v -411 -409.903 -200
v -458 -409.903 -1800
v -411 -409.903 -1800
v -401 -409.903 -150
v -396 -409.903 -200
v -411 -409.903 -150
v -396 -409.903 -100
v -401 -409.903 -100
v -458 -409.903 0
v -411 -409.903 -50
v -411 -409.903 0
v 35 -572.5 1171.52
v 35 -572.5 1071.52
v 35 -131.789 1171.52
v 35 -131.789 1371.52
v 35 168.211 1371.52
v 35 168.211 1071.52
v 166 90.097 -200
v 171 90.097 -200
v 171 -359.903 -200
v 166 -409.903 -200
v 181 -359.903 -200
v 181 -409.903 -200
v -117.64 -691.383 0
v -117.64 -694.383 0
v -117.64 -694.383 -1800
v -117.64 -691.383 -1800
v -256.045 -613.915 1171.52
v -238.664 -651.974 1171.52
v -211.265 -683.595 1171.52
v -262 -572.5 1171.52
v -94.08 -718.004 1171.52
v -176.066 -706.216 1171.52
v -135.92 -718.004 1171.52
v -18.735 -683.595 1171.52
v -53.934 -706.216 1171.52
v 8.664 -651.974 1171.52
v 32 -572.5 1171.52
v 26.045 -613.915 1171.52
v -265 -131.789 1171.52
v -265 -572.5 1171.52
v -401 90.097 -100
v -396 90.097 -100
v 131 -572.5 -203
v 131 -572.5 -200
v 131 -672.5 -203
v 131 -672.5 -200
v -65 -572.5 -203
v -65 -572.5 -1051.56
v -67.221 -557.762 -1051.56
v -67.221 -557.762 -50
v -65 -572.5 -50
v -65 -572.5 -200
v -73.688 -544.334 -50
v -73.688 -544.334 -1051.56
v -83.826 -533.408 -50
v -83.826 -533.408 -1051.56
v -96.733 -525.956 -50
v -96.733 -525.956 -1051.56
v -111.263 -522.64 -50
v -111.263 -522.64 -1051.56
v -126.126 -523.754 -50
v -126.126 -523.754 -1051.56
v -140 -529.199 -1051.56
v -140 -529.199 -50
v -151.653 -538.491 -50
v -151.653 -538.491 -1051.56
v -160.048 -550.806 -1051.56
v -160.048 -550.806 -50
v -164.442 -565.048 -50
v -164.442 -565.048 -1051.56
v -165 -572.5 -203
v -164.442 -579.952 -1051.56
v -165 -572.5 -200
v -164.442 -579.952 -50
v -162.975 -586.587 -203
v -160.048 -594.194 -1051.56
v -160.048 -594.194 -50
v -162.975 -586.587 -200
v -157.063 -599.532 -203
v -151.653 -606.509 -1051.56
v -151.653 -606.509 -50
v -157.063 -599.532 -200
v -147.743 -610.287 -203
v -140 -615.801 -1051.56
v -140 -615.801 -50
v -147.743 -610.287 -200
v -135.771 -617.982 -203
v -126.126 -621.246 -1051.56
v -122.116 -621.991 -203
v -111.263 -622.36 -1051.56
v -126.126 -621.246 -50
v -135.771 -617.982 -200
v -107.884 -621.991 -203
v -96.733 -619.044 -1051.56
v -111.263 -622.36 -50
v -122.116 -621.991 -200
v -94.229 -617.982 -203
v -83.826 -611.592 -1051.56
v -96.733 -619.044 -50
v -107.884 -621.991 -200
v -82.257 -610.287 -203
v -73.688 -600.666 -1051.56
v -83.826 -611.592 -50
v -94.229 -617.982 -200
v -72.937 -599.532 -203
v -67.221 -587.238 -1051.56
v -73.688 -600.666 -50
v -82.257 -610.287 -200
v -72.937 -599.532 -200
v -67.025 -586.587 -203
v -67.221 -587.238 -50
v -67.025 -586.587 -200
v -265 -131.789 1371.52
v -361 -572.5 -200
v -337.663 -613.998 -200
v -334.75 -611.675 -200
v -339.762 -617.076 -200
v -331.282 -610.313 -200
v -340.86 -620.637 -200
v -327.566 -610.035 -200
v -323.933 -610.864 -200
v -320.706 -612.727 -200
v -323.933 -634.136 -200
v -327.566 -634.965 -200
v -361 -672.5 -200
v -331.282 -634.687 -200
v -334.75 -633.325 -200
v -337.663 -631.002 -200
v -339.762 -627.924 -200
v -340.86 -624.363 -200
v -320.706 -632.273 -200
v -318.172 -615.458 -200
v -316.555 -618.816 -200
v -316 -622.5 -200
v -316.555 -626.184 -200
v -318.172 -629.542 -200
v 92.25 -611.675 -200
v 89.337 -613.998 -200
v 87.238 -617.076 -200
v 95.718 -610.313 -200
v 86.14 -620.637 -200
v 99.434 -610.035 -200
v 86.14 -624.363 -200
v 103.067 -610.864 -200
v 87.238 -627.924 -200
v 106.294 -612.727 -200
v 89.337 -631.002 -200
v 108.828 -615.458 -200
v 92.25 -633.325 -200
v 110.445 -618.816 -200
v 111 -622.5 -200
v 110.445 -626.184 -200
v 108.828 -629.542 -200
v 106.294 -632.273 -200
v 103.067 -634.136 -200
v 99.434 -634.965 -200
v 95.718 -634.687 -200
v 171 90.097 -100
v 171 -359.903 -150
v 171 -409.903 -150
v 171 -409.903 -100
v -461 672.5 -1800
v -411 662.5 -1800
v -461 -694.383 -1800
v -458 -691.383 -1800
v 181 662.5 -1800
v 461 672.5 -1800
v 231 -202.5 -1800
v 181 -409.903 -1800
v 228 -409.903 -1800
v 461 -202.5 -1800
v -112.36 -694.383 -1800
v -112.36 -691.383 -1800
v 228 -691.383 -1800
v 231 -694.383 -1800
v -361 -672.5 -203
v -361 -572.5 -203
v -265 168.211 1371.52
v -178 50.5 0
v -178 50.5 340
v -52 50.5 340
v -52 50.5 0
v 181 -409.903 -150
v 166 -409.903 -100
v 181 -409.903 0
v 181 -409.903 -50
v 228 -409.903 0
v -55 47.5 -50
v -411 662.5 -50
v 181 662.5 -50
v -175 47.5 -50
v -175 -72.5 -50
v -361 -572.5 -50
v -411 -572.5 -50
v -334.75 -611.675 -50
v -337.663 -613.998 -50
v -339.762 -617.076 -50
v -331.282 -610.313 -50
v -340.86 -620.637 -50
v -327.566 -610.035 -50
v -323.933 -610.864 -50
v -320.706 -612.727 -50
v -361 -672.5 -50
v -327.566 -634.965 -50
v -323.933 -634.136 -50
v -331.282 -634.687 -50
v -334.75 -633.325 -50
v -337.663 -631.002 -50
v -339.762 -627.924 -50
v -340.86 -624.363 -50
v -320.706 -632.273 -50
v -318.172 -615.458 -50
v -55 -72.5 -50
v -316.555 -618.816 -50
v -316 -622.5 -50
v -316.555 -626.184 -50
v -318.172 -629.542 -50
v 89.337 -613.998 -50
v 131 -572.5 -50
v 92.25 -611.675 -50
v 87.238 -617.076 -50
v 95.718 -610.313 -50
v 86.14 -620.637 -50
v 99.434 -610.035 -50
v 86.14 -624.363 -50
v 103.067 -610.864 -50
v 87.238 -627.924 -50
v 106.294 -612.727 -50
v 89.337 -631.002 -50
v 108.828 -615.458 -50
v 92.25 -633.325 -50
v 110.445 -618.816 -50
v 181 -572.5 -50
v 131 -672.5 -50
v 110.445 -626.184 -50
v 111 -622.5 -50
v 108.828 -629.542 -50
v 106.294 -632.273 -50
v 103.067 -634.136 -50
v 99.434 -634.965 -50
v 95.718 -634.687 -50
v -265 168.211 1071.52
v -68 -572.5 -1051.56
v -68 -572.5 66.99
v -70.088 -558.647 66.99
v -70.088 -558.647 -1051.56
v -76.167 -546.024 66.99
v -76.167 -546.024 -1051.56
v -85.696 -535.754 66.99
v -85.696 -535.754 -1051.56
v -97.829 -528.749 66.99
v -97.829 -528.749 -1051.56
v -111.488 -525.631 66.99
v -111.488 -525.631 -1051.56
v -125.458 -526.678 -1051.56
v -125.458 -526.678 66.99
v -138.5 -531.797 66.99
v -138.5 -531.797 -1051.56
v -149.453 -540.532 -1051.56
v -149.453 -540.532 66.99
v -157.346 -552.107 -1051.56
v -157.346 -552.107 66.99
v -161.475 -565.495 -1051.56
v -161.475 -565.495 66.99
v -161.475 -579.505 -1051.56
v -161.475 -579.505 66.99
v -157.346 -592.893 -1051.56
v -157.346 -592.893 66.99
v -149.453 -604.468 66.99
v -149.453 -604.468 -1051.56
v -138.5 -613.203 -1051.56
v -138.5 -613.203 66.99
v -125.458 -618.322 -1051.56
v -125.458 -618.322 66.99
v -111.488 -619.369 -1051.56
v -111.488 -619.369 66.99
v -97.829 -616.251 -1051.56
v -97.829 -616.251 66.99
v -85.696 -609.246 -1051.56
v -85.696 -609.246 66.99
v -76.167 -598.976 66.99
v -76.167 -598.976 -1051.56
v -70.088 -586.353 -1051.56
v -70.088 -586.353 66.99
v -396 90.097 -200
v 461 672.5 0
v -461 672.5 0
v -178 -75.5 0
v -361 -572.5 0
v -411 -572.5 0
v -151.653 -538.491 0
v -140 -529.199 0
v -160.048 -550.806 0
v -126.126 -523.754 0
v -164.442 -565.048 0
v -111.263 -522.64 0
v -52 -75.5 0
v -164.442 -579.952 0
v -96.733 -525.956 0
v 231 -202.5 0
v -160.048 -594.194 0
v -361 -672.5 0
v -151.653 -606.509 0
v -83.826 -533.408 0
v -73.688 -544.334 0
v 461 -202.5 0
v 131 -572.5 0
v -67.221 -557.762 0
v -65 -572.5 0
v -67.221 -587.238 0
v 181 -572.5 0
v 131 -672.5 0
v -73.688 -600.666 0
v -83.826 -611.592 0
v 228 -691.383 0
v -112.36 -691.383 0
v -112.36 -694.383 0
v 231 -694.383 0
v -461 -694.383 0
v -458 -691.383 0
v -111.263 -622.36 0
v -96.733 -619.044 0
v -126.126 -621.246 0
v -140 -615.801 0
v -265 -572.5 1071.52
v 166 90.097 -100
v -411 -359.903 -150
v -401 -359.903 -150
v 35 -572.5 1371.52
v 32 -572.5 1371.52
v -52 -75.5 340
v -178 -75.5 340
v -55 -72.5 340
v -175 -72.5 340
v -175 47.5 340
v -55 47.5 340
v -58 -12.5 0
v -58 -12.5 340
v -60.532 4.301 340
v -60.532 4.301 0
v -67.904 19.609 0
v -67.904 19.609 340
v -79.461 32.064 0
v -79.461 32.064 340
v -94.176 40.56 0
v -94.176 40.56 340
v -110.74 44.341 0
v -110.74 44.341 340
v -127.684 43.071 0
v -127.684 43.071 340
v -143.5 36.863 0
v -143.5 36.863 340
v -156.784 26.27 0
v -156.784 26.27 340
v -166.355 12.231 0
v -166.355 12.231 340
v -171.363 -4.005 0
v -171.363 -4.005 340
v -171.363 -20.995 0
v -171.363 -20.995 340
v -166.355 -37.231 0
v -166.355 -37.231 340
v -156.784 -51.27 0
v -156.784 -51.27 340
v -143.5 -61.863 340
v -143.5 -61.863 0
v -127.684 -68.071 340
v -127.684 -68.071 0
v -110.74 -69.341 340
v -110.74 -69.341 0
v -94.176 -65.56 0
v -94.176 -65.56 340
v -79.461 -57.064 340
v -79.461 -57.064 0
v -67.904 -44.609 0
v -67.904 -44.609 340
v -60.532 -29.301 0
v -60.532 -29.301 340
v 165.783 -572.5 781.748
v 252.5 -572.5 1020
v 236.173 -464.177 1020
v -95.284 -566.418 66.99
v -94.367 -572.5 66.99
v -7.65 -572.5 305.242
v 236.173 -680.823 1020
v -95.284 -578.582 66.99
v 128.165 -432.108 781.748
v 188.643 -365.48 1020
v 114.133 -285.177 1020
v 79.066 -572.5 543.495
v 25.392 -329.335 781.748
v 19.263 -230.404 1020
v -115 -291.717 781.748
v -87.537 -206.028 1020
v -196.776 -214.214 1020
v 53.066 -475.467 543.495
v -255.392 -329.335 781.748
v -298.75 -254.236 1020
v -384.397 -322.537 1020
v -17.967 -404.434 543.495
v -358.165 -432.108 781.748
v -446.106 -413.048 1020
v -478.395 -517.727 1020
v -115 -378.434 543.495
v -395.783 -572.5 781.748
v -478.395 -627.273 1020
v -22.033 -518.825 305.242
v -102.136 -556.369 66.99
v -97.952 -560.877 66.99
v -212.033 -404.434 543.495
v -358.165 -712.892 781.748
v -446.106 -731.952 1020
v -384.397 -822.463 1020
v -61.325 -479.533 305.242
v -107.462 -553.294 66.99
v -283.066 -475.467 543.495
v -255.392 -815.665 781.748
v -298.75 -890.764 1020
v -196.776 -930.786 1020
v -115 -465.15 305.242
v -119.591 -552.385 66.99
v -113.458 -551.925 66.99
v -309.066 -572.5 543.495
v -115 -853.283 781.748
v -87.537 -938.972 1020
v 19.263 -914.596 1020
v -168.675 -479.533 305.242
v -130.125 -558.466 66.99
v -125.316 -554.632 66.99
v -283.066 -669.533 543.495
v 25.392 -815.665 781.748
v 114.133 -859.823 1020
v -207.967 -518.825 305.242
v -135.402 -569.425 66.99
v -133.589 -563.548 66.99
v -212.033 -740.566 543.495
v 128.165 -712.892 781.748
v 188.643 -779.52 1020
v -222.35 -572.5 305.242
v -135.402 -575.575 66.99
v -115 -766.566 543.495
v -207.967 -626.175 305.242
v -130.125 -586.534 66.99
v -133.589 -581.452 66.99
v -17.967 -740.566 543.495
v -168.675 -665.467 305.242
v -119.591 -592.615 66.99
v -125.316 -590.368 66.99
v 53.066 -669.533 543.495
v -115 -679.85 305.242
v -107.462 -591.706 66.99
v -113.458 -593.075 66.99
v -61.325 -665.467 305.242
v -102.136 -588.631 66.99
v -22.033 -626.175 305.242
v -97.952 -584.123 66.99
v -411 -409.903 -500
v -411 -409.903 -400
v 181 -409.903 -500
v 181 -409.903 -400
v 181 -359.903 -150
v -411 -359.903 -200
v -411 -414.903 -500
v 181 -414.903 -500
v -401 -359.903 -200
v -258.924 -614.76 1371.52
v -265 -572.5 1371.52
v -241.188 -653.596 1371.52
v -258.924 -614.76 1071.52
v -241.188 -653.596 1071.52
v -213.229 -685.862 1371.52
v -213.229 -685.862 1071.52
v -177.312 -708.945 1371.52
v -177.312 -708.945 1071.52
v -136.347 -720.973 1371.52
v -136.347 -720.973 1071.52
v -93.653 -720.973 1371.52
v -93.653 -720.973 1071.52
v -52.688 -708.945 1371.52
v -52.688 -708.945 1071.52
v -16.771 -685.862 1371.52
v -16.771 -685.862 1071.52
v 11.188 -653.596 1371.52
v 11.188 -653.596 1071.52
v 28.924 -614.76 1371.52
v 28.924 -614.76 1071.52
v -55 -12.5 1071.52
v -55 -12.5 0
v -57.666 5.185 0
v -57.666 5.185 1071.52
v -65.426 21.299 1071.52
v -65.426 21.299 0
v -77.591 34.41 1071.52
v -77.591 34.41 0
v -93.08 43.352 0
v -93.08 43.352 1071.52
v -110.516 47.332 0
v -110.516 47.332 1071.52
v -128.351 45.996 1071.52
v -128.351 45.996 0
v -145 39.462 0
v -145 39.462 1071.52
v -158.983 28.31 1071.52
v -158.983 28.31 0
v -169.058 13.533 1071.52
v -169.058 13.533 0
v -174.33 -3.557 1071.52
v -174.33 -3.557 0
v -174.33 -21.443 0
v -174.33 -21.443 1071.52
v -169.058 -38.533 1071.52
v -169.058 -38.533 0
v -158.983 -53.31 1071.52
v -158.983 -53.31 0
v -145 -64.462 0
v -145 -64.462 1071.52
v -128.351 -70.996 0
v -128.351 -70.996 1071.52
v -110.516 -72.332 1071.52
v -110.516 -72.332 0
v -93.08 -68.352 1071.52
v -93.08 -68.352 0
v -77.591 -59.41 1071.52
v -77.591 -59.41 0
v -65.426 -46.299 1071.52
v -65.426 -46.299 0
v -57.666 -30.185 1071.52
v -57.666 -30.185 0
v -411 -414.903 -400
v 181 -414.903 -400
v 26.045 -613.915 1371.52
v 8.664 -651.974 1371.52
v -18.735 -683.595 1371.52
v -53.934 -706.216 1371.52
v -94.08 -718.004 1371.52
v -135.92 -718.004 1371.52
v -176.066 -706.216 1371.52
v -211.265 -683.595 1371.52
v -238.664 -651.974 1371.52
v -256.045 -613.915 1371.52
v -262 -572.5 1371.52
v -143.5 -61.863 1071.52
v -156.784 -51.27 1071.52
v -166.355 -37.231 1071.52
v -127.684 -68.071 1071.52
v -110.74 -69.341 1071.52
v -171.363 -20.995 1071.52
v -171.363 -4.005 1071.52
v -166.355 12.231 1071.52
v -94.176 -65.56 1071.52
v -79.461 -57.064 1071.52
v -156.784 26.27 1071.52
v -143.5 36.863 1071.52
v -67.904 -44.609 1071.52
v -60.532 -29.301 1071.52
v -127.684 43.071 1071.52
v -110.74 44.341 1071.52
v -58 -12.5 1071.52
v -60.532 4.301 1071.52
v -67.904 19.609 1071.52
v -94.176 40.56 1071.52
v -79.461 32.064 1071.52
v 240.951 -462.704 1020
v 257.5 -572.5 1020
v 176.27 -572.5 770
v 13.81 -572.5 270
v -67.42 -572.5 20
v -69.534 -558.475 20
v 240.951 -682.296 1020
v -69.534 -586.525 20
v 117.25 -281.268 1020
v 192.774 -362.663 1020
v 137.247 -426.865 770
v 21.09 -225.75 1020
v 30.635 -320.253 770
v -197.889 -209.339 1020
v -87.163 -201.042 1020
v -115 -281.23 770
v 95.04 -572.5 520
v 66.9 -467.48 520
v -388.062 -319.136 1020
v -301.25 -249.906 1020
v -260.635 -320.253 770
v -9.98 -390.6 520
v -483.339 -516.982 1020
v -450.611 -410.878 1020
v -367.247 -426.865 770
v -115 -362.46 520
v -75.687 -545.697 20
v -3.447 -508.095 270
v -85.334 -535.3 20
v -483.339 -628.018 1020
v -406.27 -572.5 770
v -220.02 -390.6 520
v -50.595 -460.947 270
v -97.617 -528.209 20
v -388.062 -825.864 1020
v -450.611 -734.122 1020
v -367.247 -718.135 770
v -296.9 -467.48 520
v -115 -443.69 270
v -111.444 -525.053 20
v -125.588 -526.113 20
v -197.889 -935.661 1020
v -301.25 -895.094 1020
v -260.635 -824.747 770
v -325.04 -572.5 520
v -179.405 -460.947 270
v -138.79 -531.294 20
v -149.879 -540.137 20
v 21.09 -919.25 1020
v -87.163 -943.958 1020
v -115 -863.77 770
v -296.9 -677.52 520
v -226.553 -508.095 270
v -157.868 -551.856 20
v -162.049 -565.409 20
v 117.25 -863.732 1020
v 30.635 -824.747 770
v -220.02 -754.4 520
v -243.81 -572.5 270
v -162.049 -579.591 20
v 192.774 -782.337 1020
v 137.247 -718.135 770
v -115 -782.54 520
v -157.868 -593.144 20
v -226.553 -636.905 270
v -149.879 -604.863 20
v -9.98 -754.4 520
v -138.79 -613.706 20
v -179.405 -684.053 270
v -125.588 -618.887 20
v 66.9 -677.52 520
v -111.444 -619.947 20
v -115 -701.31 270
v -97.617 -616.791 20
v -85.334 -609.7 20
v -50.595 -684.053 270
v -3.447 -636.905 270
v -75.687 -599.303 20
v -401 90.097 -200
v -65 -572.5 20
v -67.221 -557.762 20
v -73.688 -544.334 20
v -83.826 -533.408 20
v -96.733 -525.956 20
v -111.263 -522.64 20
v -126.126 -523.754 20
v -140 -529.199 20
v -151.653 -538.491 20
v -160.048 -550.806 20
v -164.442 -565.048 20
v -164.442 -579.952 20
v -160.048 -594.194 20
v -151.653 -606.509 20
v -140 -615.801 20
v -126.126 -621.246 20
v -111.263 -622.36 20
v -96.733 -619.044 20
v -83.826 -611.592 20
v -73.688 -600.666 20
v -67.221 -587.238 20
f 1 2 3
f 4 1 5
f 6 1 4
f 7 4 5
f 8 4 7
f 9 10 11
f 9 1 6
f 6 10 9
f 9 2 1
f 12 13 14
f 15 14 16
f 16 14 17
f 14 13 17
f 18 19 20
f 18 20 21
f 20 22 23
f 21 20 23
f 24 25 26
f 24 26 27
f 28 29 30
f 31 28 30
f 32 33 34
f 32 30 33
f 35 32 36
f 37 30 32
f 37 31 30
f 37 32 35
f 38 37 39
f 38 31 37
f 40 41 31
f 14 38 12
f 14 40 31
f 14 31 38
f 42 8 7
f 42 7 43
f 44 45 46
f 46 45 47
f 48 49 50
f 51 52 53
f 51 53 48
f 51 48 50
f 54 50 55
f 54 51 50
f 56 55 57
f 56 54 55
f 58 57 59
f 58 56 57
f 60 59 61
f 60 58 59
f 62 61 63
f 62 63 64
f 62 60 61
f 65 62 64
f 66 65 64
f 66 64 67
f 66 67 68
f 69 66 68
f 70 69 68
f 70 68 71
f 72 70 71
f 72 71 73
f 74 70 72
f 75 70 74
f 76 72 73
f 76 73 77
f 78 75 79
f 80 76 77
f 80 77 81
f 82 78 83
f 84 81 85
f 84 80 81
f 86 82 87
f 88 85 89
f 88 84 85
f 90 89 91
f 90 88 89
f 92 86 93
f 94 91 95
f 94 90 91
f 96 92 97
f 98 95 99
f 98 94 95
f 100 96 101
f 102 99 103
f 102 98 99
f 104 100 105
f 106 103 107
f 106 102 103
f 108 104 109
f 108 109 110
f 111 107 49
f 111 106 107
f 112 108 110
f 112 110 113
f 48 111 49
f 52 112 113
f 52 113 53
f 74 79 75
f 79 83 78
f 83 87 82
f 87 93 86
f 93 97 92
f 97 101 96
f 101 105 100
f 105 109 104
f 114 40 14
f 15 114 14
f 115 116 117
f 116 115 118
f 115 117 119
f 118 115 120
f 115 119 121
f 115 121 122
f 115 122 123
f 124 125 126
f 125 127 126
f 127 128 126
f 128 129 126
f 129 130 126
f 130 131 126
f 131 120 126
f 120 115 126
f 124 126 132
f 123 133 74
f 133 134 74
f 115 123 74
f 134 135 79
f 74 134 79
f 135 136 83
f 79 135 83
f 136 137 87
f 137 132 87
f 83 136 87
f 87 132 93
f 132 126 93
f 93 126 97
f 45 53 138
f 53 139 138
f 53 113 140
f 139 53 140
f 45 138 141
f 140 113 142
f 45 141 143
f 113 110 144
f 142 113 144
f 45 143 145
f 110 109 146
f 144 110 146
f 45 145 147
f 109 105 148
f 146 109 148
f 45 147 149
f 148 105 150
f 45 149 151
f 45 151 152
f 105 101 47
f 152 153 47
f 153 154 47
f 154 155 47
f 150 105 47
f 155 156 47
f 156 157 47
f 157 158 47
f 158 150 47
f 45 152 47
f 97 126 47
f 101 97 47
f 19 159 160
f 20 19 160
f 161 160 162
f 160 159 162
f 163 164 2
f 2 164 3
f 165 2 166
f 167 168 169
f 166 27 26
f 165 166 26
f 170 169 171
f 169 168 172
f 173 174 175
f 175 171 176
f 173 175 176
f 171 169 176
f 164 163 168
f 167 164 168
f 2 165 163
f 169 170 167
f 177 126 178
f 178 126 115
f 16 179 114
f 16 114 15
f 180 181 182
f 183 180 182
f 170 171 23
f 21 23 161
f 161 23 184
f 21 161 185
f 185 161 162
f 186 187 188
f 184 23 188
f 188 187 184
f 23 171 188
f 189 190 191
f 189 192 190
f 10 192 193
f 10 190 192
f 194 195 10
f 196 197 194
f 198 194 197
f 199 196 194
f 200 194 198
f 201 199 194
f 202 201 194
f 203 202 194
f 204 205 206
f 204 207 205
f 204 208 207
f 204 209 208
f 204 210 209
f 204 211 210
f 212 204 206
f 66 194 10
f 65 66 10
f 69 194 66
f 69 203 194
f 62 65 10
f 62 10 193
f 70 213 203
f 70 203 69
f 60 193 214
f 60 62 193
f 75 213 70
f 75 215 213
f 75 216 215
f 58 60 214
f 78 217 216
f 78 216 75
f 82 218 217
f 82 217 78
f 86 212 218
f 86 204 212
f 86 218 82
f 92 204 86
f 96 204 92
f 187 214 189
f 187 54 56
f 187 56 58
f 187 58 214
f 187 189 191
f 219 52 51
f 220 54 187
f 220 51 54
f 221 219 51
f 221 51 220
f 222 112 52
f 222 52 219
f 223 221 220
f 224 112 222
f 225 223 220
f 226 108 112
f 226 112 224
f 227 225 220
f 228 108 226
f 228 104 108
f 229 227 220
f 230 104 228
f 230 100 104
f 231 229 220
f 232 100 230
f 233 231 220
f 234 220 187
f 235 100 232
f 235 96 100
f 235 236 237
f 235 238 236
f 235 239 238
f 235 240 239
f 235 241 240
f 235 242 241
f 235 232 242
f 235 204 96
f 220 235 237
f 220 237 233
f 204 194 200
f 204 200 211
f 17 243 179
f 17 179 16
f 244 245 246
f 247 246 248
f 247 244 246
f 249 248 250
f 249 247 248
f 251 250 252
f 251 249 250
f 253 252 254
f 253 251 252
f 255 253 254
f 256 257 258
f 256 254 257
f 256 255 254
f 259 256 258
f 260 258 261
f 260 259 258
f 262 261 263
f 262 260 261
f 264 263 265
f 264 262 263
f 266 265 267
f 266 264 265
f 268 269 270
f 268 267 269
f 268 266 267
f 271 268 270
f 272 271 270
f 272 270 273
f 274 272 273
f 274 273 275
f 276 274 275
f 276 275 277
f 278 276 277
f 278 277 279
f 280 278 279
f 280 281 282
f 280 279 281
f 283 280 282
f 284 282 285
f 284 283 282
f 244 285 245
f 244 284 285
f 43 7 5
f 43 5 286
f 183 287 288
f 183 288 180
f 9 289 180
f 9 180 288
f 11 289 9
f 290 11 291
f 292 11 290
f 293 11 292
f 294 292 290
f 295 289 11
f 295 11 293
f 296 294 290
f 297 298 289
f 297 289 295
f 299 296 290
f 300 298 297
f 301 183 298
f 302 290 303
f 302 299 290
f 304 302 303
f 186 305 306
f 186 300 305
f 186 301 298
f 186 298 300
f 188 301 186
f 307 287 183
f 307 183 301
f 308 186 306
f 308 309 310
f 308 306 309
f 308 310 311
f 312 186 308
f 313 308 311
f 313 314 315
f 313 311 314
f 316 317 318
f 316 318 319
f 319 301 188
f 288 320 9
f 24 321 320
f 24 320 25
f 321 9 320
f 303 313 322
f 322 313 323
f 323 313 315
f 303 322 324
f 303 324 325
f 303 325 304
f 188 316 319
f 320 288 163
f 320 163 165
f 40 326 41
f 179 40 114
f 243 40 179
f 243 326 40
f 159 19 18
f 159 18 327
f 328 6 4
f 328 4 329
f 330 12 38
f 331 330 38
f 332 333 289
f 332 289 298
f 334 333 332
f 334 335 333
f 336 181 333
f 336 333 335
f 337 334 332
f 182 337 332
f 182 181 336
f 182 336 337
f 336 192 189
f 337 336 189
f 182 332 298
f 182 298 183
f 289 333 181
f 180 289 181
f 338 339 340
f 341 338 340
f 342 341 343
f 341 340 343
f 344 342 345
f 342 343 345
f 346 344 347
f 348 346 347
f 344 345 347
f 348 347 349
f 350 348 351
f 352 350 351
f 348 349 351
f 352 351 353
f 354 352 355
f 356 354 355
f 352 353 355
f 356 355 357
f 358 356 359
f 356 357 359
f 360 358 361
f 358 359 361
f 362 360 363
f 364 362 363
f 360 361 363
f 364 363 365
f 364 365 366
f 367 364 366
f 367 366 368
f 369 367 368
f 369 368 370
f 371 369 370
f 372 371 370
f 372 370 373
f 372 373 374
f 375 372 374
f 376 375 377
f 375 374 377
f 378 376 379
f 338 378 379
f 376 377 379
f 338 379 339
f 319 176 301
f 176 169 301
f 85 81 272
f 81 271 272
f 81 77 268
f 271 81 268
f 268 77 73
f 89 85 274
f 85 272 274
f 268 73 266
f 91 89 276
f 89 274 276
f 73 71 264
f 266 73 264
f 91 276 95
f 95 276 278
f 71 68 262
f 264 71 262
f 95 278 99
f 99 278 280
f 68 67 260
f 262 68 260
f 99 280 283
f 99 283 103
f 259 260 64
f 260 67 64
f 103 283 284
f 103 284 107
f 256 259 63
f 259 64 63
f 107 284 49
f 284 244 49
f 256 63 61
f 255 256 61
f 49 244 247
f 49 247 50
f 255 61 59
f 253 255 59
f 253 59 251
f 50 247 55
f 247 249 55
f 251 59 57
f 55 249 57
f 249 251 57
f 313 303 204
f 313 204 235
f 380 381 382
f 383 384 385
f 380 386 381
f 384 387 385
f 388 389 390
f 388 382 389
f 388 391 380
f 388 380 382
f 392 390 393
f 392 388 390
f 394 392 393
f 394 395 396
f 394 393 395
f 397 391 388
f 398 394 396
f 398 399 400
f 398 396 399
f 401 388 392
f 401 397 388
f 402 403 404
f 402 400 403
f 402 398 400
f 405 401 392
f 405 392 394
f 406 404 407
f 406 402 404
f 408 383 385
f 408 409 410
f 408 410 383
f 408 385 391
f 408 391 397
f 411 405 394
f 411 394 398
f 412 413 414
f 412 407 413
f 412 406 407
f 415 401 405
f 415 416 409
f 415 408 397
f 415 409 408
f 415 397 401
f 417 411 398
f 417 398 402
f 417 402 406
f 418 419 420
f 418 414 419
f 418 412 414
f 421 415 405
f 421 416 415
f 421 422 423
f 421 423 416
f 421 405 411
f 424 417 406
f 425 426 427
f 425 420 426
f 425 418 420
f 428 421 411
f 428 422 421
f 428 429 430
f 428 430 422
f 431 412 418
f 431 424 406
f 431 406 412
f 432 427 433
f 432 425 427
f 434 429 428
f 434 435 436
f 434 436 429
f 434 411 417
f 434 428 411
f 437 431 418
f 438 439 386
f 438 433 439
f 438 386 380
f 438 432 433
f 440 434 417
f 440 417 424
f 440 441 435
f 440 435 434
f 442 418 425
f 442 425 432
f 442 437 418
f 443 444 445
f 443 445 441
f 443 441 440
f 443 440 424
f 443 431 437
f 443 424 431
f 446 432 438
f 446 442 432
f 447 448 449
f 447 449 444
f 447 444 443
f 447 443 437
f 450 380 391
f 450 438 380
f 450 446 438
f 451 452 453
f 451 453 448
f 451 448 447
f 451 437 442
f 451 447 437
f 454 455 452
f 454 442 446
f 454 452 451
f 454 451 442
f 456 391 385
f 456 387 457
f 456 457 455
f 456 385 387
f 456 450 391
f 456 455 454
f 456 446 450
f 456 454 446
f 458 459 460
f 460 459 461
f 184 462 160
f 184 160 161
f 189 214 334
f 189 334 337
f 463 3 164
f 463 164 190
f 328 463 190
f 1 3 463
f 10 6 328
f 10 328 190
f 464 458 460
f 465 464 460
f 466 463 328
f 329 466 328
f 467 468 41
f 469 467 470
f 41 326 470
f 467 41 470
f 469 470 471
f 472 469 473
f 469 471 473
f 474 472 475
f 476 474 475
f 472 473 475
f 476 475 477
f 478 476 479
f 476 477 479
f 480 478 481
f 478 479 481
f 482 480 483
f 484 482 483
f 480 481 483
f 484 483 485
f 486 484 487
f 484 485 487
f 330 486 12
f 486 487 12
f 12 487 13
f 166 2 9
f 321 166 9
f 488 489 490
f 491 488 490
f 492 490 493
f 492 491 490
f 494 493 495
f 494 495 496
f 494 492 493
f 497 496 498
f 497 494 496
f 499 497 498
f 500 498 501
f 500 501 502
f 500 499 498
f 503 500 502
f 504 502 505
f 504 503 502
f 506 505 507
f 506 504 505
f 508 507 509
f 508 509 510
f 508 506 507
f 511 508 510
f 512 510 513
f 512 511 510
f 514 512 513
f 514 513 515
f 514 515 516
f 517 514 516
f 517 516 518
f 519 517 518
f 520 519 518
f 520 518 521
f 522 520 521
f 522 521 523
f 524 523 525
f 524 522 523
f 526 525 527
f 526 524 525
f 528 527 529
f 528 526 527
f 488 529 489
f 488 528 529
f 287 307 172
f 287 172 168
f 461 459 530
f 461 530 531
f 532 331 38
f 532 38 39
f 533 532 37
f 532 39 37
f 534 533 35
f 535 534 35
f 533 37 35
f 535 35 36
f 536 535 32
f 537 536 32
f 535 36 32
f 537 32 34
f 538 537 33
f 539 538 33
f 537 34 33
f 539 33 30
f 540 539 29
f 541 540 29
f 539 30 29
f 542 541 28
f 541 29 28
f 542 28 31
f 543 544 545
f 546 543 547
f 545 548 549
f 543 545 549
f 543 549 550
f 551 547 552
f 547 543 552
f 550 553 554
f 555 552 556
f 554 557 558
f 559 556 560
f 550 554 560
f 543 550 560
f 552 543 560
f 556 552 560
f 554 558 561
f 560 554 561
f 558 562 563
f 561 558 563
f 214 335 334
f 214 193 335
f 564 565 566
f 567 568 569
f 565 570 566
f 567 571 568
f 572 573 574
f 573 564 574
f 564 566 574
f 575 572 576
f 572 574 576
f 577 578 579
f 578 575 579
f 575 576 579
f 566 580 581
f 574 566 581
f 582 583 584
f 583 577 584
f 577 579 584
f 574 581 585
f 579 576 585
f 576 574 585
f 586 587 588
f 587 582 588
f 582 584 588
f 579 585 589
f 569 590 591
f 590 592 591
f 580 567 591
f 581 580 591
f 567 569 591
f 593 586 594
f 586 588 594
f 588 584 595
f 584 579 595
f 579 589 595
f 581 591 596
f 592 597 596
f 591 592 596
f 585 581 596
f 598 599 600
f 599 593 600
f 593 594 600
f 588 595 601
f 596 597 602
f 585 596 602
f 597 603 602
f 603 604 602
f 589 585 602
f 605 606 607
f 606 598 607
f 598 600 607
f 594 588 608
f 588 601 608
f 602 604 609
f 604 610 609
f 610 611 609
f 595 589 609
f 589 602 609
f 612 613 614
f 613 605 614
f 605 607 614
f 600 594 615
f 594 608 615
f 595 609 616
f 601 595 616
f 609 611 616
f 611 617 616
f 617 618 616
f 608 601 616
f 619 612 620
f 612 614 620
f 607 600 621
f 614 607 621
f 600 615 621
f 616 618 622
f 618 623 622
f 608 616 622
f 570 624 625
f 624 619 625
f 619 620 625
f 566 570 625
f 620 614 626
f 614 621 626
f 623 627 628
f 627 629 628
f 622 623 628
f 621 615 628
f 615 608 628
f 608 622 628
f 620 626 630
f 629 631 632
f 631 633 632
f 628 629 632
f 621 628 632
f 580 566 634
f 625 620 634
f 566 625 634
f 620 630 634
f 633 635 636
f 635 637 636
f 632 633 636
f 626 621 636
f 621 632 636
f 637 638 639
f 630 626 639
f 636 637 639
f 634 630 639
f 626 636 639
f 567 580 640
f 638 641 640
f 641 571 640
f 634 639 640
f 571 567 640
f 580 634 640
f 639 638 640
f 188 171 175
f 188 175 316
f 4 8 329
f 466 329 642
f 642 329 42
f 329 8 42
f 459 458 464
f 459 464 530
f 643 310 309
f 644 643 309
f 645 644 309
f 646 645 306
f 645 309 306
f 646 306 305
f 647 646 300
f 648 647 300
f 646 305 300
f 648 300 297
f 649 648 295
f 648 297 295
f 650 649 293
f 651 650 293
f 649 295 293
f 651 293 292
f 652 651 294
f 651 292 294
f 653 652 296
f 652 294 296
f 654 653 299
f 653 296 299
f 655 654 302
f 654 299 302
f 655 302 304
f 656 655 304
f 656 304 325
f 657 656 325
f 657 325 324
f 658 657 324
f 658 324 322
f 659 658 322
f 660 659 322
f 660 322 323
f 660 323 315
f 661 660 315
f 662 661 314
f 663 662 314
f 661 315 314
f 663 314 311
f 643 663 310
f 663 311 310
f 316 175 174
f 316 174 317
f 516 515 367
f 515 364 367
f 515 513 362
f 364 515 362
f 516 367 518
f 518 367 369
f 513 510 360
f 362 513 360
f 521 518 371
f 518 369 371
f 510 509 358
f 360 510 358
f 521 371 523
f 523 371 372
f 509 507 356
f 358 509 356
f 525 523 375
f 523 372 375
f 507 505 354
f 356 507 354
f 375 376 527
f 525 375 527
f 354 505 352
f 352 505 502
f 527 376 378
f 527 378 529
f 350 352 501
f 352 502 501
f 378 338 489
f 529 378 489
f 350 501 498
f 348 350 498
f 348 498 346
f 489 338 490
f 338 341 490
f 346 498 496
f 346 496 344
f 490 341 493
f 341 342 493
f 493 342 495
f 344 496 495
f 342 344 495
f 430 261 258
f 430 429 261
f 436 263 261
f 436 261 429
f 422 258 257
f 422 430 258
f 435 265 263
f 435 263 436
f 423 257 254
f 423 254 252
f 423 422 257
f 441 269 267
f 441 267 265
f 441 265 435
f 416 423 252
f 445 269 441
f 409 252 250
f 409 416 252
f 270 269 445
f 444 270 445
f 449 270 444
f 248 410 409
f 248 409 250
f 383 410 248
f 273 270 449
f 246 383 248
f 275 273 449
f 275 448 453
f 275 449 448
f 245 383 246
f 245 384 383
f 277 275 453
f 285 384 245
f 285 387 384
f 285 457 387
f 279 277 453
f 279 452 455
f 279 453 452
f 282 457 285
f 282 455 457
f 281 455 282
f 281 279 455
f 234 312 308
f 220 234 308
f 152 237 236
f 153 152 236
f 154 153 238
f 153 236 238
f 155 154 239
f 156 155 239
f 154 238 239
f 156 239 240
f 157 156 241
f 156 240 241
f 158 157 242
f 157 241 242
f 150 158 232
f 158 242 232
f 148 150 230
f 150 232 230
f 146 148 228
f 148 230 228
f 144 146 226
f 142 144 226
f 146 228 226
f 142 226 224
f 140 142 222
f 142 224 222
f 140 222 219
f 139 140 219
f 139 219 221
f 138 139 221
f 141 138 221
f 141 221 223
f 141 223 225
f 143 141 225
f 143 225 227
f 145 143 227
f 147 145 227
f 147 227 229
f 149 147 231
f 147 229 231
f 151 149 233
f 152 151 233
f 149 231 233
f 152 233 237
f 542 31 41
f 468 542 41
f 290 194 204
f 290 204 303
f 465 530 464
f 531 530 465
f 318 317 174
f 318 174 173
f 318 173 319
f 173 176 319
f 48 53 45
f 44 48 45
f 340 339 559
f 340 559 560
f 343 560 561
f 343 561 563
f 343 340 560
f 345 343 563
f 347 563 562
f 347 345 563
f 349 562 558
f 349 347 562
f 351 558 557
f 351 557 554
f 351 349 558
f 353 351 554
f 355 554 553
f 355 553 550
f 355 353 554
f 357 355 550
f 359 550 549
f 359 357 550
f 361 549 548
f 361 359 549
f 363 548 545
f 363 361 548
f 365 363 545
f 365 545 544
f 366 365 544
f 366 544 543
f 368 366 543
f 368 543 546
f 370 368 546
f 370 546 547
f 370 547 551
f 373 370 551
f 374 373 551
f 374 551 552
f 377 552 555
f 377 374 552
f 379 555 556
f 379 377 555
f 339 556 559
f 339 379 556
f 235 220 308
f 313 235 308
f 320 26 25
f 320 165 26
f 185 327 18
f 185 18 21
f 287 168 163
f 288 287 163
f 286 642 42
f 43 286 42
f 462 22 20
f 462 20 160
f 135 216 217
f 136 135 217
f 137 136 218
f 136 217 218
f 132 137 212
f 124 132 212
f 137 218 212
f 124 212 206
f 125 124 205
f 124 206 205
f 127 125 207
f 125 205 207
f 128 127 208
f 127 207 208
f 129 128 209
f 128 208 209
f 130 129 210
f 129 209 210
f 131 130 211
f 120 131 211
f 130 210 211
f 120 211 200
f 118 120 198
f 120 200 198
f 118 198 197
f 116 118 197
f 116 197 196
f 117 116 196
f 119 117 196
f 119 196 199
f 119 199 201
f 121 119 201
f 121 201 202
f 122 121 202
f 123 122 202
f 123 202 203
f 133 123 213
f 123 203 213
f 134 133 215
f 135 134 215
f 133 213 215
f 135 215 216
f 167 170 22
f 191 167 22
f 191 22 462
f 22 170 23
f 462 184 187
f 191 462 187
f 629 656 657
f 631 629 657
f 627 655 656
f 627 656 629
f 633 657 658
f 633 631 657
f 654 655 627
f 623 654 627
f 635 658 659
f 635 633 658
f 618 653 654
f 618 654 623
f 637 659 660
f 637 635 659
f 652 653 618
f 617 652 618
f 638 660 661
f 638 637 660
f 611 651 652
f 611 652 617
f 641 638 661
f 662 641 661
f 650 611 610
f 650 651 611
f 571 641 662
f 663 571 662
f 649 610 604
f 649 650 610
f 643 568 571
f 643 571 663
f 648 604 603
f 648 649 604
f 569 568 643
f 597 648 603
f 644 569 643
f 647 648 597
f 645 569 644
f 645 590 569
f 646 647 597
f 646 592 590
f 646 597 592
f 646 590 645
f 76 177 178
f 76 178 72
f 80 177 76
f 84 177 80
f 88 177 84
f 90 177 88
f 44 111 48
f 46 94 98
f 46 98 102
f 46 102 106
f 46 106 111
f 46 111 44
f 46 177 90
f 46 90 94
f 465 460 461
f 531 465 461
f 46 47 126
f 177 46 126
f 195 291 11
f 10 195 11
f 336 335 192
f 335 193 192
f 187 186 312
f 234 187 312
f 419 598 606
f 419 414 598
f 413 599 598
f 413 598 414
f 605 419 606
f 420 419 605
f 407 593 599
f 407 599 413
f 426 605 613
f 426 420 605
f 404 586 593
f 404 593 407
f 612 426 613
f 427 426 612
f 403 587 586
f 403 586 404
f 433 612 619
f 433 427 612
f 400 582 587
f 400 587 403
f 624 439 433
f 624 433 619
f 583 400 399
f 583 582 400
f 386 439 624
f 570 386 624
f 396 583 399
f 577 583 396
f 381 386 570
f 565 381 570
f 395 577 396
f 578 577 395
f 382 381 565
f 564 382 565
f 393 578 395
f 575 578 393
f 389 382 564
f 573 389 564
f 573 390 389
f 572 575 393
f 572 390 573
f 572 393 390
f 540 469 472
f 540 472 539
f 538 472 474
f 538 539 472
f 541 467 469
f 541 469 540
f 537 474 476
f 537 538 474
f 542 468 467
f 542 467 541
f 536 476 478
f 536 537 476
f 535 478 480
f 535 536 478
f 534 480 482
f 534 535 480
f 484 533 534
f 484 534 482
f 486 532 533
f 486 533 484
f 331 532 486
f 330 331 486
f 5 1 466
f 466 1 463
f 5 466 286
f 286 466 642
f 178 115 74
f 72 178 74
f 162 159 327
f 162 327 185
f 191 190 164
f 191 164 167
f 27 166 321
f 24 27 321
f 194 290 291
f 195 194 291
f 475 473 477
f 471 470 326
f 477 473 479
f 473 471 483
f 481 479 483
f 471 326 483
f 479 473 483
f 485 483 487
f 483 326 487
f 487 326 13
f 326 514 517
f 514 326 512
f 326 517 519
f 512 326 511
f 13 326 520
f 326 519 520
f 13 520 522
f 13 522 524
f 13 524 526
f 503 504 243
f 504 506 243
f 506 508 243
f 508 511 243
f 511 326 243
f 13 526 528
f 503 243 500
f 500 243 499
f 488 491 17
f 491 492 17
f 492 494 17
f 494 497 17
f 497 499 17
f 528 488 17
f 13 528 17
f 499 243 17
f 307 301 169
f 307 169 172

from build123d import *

# Parameters (mm, degrees)
F0_W           = 692
F0_H           = 470
F1_DEPTH       = 1800
F3_DEPTH       = 1800
F4_W           = 592
F4_H           = 1750
F5_DEPTH       = 1235
F6_W           = 120
F6_H           = 120
F7_DEPTH       = 50
F8_W           = 126
F8_H           = 126
F8_W_2         = 120
F8_H_2         = 120
F9_DEPTH       = 340
F10_R          = 60
F10_R_2        = 57
F11_DEPTH      = 731.52
F11_DEPTH_BACK = 340
F12_W          = 492
F12_H          = 50
F13_DEPTH      = 100
F14_R          = 50
F15_DEPTH      = 50
F16_R          = 50
F16_R_2        = 47
F17_DEPTH      = 1051.56
F17_DEPTH_BACK = 20
F18_W          = 50
F18_H          = 50
F19_DEPTH      = 10
F20_W          = 50
F20_H          = 50
F21_DEPTH      = 10
F22_W          = 500
F22_H          = 100
F23_DEPTH      = 5
F24_W          = 500
F24_H          = 100
F25_DEPTH      = 5
F26_W          = 592
F26_H          = 100
F27_DEPTH      = 5
F28_R          = 12.5
F29_DEPTH      = 150
F31_DEPTH      = 3
F33_R          = 372.5
F34_DEPTH      = 1000
F34_TAPER      = 18
F35_R          = 367.5
F36_DEPTH      = 1002.284
F36_TAPER      = 20
F37_R          = 47
F38_DEPTH      = 46.99
F40_DEPTH      = 100
F41_W          = 300
F41_H          = 300
F42_DEPTH      = 200
F44_DEPTH      = 200
F46_W          = 3
F46_H          = 1800
F45_W          = 3
F45_H          = 1800
F47_DEPTH      = 284.48
F48_W          = 3
F48_H          = 1800
F49_DEPTH      = 340.36
F50_W          = 3
F50_H          = 1800
F51_DEPTH      = 340.36


with BuildPart() as f1:
    # F0 (on Top) → F1 (new body)
    with BuildSketch(Plane.XY):
        Polygon((-461, -202.5), (231, -202.5), (461, -202.5), (461, 672.5), (-461, 672.5), align=None)
        with Locations((-115, -437.5)):
            Rectangle(F0_W, F0_H)
    extrude(amount=-F1_DEPTH)

    # F2 (on face) → F3 (cut, through all)
    with BuildSketch(Plane.XY):
        Polygon((-411, -409.9026024342), (-461, -409.9026024342), (-461, -672.5), (231, -672.5), (231, -409.9026024342), (181, -409.9026024342), (181, -572.5), (-411, -572.5), align=None)
    extrude(amount=-F3_DEPTH, mode=Mode.SUBTRACT)

    # F4 (on face) → F5 (cut)
    with BuildSketch(Plane.XZ.offset(572.5)):
        with Locations((-115, -925)):
            Rectangle(F4_W, F4_H)
    extrude(amount=-F5_DEPTH, mode=Mode.SUBTRACT)

    # F6 (on face) → F7 (cut, through all)
    with BuildSketch(Plane.XY):
        with Locations((-115, -12.5)):
            Rectangle(F6_W, F6_H)
    extrude(amount=-F7_DEPTH, mode=Mode.SUBTRACT)

    # F8 (on face) → F9 (join)
    with BuildSketch(Plane.XY):
        with Locations((-115, -12.5)):
            Rectangle(F8_W, F8_H)
        with Locations((-115, -12.5)):
            Rectangle(F8_W_2, F8_H_2, mode=Mode.SUBTRACT)
    extrude(amount=F9_DEPTH)

    # F12 (on face) → F13 (join)
    with BuildSketch(Plane.XZ.offset(572.5)):
        with Locations((-115, -25)):
            Rectangle(F12_W, F12_H)
    extrude(amount=F13_DEPTH)

    # F14 (on face) → F15 (cut, through all)
    with BuildSketch(Plane.XY):
        with Locations((-115, -572.5)):
            Circle(F14_R)
    extrude(amount=-F15_DEPTH, mode=Mode.SUBTRACT)

    # F16 (on face) → F17 (join, two sides)
    with BuildSketch(Plane.XY) as f17_sk:
        with Locations((-115, -572.5)):
            Circle(F16_R)
        with Locations((-115, -572.5)):
            Circle(F16_R_2, mode=Mode.SUBTRACT)
    extrude(amount=-F17_DEPTH)
    extrude(f17_sk.sketch, amount=F17_DEPTH_BACK)

    # F18 (on face) → F19 (join)
    with BuildSketch(Plane.YZ.offset(-411)):
        with Locations((-384.9026024342, -175)):
            Rectangle(F18_W, F18_H)
    extrude(amount=F19_DEPTH)

    # F20 (on face) → F21 (join)
    with BuildSketch(Plane(origin=(181, 0, 0), x_dir=(0, -1, 0), z_dir=(-1, 0, 0))):
        with Locations((384.9026024342, -175)):
            Rectangle(F20_W, F20_H)
    extrude(amount=F21_DEPTH)

    # F22 (on face) → F23 (join)
    with BuildSketch(Plane.YZ.offset(-401)):
        with Locations((-159.9026024342, -150)):
            Rectangle(F22_W, F22_H)
    extrude(amount=F23_DEPTH)

    # F24 (on face) → F25 (join)
    with BuildSketch(Plane(origin=(171, 0, 0), x_dir=(0, -1, 0), z_dir=(-1, 0, 0))):
        with Locations((159.9026024342, -150)):
            Rectangle(F24_W, F24_H)
    extrude(amount=F25_DEPTH)

    # F28 (on face) → F29 (join)
    with BuildSketch(Plane(origin=(0, 0, -50), x_dir=(1, 0, 0), z_dir=(0, 0, -1))):
        with Locations((-328.5, 622.5)):
            Circle(F28_R)
        with Locations((98.5, 622.5)):
            Circle(F28_R)
    extrude(amount=F29_DEPTH)

    # F30 (on face) → F31 (join)
    with BuildSketch(Plane(origin=(0, 0, -200), x_dir=(1, 0, 0), z_dir=(0, 0, -1))):
        with BuildLine():
            Line((131, 672.5), (-361, 672.5))
            Line((-361, 672.5), (-361, 572.5))
            Line((-361, 572.5), (-165, 572.5))
            ThreePointArc((-165, 572.5), (-115, 622.5), (-65, 572.5))
            Line((-65, 572.5), (131, 572.5))
            Line((131, 572.5), (131, 672.5))
        make_face()
    extrude(amount=F31_DEPTH)

    # F33 (on offset) → F34 (join, through all)
    with BuildSketch(Plane.XY.offset(1020)):
        with Locations((-115, -572.5)):
            Circle(F33_R)
    extrude(amount=-F34_DEPTH, taper=F34_TAPER)

    # F35 (on face) → F36 (cut)
    with BuildSketch(Plane.XY.offset(1020)):
        with Locations((-115, -572.5)):
            Circle(F35_R)
    extrude(amount=-F36_DEPTH, taper=F36_TAPER, mode=Mode.SUBTRACT)

    # F37 (on face) → F38 (cut)
    with BuildSketch(Plane(origin=(0, 0, 20), x_dir=(1, 0, 0), z_dir=(0, 0, -1))):
        with Locations((-115, 572.5)):
            Circle(F37_R)
    extrude(amount=-F38_DEPTH, mode=Mode.SUBTRACT)

    # F46 (on face) + F45 (on face) → F47 (join)
    with BuildSketch(Plane.XZ.offset(409.9026024342)):
        with Locations((229.5, -900)):
            Rectangle(F46_W, F46_H)
    with BuildSketch(Plane.XZ.offset(409.9026024342)):
        with Locations((-459.5, -900)):
            Rectangle(F45_W, F45_H)
    extrude(amount=F47_DEPTH)

    # F48 (on face) → F49 (join)
    with BuildSketch(Plane.YZ.offset(-458)):
        with Locations((-692.8826024342, -900)):
            Rectangle(F48_W, F48_H)
    extrude(amount=F49_DEPTH)

    # F50 (on face) → F51 (join)
    with BuildSketch(Plane(origin=(228, 0, 0), x_dir=(0, -1, 0), z_dir=(-1, 0, 0))):
        with Locations((692.8826024342, -900)):
            Rectangle(F50_W, F50_H)
    extrude(amount=F51_DEPTH)


with BuildPart() as f11:
    # F10 (on face) → F11 (new body, two sides)
    with BuildSketch(Plane.XY.offset(340)) as f11_sk:
        with Locations((-115, -12.5)):
            Circle(F10_R)
        with Locations((-115, -12.5)):
            Circle(F10_R_2, mode=Mode.SUBTRACT)
    extrude(amount=F11_DEPTH)
    extrude(f11_sk.sketch, amount=-F11_DEPTH_BACK)

    # F39 (on face) → F40 (join)
    with BuildSketch(Plane.XY.offset(1071.52)):
        with BuildLine():
            Line((35, 168.2110980594), (-265, 168.2110980594))
            Line((-265, 168.2110980594), (-265, -231.7889019406))
            Line((-265, -231.7889019406), (-265, -572.5))
            ThreePointArc((-265, -572.5), (-115, -722.5), (35, -572.5))
            Line((35, -572.5), (35, -231.7889019406))
            Line((35, -231.7889019406), (35, 168.2110980594))
        make_face()
    extrude(amount=F40_DEPTH)

    # F41 (on face) → F42 (join)
    with BuildSketch(Plane.XY.offset(1171.52)):
        with Locations((-115, 18.2110980594)):
            Rectangle(F41_W, F41_H)
    extrude(amount=F42_DEPTH)

    # F43 (on face) → F44 (join)
    with BuildSketch(Plane.XY.offset(1171.52)):
        with BuildLine():
            Line((-262, -572.5), (-265, -572.5))
            ThreePointArc((-265, -572.5), (-115, -722.5), (35, -572.5))
            Line((35, -572.5), (32, -572.5))
            ThreePointArc((32, -572.5), (-115, -719.5), (-262, -572.5))
        make_face()
    extrude(amount=F44_DEPTH)


with BuildPart() as f27:
    # F26 (on face) → F27 (new body)
    with BuildSketch(Plane.XZ.offset(409.9026024342)):
        with Locations((-115, -450)):
            Rectangle(F26_W, F26_H)
    extrude(amount=F27_DEPTH)


solid = Compound([f1.part, f11.part, f27.part])
